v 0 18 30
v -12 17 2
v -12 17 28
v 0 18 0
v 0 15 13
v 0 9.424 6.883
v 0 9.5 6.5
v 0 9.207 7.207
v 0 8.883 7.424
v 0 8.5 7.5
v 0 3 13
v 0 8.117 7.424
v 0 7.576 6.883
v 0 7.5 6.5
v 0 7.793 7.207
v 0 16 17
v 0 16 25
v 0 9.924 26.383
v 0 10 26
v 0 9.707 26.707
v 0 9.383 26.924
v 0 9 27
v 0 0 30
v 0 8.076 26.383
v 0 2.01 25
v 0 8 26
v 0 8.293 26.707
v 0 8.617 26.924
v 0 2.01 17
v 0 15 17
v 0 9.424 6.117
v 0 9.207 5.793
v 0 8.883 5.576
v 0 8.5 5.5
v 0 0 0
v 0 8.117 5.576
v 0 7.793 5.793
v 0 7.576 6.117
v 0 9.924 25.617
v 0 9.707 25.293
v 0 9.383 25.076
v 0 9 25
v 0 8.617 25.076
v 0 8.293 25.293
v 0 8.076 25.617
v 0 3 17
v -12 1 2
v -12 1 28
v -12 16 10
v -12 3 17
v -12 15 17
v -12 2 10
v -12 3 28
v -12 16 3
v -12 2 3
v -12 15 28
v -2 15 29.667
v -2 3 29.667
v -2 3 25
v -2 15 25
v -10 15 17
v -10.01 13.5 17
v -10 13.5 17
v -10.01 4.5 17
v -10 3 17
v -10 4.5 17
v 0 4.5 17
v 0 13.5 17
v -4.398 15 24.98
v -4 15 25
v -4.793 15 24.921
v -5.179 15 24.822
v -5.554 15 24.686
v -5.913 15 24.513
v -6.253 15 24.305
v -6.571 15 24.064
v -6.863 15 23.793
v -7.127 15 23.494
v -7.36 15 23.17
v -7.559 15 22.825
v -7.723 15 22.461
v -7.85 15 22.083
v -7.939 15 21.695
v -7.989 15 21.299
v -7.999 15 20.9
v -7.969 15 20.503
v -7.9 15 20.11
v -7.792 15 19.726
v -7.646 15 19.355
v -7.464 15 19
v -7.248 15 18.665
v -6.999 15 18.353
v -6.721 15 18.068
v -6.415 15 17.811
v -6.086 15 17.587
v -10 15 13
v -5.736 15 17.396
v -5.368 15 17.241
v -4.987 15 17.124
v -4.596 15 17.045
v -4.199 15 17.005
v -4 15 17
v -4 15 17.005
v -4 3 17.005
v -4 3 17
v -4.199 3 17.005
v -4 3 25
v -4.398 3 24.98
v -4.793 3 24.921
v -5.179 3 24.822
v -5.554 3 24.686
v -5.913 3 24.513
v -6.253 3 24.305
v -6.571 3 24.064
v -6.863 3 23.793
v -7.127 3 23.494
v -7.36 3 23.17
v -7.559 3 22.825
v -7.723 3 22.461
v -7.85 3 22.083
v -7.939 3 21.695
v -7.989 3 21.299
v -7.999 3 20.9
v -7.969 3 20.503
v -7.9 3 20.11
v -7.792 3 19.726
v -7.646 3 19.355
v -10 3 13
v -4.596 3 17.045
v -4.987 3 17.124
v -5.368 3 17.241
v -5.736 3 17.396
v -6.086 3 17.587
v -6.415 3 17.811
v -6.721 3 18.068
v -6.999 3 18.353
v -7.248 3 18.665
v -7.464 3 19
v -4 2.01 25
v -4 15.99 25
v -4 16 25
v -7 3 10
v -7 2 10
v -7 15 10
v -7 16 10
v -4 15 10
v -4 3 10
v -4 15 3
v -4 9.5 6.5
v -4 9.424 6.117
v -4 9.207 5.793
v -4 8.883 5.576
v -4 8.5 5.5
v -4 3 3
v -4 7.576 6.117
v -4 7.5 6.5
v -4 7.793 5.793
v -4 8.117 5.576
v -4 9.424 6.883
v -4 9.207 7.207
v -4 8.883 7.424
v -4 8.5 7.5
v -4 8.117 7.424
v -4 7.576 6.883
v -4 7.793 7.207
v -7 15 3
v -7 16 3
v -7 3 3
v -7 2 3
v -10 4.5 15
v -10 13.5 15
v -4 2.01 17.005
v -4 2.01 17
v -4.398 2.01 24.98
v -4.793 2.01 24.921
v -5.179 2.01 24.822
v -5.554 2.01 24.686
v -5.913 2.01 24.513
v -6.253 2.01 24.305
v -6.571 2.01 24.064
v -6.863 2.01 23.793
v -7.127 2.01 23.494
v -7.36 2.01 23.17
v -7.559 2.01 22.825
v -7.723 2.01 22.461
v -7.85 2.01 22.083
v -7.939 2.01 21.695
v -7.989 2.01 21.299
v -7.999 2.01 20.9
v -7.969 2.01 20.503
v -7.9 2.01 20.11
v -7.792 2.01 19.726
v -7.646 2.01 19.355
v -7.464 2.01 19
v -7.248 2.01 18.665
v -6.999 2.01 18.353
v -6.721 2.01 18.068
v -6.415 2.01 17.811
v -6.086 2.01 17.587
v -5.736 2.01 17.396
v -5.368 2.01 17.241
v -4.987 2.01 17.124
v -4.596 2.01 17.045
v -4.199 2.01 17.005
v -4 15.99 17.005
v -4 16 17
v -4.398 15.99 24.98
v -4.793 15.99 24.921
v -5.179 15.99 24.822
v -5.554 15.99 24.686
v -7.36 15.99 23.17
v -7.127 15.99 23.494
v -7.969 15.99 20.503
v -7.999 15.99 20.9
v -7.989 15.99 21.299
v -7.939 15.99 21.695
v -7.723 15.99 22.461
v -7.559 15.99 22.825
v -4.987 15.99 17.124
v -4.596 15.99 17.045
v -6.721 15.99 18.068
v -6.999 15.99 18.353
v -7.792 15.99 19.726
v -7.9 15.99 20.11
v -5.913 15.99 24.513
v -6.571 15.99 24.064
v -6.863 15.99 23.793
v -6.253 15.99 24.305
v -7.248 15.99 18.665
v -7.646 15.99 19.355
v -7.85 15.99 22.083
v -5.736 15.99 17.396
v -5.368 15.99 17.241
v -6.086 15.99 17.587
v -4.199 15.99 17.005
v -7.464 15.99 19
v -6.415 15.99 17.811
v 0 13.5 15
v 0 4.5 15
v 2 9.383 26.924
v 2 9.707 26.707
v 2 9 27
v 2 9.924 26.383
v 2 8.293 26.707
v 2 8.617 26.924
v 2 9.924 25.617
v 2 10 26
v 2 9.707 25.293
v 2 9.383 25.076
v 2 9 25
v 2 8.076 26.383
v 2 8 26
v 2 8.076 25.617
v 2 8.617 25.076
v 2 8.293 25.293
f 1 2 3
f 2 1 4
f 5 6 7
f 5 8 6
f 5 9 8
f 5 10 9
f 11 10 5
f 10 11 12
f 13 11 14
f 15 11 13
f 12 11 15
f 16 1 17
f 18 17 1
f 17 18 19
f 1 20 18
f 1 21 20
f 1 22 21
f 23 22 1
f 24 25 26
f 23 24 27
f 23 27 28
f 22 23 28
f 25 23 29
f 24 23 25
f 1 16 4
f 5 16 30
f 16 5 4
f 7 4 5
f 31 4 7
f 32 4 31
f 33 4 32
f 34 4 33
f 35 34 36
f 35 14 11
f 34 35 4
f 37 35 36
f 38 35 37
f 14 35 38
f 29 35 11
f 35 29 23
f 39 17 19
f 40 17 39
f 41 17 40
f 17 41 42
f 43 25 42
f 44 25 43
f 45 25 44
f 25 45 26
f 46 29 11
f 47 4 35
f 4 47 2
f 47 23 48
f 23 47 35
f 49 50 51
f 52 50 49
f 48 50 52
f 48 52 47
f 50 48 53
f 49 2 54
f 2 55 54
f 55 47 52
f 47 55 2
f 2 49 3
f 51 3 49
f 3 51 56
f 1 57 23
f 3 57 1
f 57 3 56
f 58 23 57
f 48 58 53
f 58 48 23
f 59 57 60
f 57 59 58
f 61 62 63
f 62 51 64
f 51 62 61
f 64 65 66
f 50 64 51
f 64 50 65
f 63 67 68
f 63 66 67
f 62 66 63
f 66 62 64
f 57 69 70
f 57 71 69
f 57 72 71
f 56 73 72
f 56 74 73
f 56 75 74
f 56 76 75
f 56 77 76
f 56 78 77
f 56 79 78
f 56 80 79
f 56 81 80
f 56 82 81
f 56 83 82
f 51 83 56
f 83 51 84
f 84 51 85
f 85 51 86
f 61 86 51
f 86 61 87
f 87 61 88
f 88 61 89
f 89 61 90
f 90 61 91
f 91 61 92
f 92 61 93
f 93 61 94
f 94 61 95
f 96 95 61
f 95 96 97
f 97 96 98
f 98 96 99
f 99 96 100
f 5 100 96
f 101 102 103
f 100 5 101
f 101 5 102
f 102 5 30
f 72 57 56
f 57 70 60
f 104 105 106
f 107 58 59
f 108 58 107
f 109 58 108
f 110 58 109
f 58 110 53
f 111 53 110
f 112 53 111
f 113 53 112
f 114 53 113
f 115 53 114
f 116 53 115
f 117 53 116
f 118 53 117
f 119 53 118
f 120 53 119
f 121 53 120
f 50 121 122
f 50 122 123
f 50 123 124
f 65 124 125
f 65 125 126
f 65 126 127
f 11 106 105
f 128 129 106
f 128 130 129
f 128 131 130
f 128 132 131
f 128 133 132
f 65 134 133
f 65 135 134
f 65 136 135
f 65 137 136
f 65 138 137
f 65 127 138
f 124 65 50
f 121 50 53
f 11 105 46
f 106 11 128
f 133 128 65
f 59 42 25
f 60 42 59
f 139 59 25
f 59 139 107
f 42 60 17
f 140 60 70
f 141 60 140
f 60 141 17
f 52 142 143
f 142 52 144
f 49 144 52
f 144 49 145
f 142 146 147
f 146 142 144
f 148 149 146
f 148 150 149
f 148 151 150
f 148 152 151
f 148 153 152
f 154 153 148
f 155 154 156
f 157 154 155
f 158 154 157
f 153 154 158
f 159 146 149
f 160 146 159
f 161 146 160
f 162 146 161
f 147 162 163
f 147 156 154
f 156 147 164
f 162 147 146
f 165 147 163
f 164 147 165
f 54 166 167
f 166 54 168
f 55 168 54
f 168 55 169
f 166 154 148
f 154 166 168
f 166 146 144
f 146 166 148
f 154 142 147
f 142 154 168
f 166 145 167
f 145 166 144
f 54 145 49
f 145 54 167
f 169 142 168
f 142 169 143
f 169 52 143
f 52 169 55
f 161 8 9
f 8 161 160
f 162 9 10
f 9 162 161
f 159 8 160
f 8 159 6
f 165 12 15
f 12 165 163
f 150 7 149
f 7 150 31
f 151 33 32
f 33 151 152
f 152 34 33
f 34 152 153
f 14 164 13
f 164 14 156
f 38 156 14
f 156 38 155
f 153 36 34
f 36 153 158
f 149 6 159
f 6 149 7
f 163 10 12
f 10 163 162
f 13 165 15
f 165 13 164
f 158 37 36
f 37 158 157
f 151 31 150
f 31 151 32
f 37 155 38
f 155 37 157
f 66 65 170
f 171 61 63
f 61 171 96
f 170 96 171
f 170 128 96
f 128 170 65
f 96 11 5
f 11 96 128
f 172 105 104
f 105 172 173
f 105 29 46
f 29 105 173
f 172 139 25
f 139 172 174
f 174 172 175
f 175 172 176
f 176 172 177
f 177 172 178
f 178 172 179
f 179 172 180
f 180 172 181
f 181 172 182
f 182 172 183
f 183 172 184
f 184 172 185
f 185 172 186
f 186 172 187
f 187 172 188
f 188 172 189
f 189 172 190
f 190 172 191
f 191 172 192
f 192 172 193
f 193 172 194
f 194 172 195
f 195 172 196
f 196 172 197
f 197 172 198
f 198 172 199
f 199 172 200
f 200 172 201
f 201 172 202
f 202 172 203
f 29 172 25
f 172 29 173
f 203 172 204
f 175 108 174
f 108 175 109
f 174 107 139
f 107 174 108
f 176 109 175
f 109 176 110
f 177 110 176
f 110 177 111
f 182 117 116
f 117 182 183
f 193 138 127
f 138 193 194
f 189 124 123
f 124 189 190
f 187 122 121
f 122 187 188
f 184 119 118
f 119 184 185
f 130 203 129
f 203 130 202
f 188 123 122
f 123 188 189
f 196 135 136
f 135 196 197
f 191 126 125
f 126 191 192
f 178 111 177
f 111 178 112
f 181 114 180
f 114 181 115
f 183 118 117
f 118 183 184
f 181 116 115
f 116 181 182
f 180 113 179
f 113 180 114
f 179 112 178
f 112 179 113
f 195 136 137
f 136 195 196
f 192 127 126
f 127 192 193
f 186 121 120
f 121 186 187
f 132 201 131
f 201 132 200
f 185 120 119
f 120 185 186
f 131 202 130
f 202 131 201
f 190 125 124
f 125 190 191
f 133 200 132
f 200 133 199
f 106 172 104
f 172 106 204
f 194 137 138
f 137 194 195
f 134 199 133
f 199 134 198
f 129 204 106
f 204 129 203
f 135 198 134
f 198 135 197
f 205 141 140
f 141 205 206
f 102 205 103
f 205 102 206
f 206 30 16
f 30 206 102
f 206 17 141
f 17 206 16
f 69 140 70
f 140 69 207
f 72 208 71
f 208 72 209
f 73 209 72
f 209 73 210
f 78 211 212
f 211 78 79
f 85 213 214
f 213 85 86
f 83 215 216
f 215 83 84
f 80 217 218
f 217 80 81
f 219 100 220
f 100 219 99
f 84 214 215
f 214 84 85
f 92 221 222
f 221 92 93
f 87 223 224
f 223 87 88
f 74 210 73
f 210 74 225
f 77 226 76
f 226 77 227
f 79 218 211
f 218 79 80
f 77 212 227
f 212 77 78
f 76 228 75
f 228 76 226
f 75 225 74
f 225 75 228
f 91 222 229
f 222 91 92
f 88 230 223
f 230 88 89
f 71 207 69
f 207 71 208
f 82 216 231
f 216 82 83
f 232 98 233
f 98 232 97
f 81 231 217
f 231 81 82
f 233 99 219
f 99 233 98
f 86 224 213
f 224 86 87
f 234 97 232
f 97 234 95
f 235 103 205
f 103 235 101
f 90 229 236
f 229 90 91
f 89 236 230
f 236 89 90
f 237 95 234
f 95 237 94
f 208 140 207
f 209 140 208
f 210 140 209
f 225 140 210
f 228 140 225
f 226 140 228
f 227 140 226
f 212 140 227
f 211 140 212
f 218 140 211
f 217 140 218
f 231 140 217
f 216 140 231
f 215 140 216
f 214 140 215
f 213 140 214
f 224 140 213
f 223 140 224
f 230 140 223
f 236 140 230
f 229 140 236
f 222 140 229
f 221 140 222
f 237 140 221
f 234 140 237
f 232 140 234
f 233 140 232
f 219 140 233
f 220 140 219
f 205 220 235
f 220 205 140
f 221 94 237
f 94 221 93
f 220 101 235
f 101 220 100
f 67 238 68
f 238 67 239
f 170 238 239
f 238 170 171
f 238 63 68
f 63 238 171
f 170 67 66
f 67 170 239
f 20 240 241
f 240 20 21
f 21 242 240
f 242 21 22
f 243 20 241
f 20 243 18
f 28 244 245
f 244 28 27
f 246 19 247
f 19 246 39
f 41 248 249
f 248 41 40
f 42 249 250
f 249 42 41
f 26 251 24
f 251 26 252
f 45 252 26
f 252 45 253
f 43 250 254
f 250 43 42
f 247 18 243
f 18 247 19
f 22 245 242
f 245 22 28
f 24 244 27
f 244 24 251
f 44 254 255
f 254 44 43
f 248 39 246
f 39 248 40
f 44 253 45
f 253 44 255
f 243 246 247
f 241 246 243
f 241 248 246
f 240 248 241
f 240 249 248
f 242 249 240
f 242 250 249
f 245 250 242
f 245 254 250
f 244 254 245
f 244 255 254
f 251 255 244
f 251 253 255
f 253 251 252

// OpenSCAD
// file: signal_generator_foot.scad
$fa = 1;
$fs = 0.4;


initial_block_points = [
    // lower plane
    [  0,  0,  0 ],  //0
    [  0, 18,  0 ],  //1
    [ 30, 18,  0 ],  //2
    [ 30,  0,  0 ],  //3
    // upper plane
    [  2,  1, 12 ],  //4
    [  2, 17, 12 ],  //5
    [ 28, 17, 12 ],  //6
    [ 28,  1, 12 ]]; //7

  
initial_block_faces = [
    [0,1,2,3],  // lower plane
    [4,5,6,7],  // upper plane
    [0,1,5,4],  // west
    [1,2,6,5],  // north
    [2,3,7,6],  // east
    [3,0,4,7]]; // south



module signal_generator_foot() {
    
    difference() {
        
        // hull to ensure the polyhedron is solid when performing the difference
        hull() {
            polyhedron(points=initial_block_points, faces=initial_block_faces);
        }
        
        translate([17, 3, 2])
            cube([13, 12, 12+0.01]);    
        
        translate([15, 3, -0.01])
            cube([10, 12, 2+0.02]);    
        
        translate([3, 3, 4])
            cube([7, 12, 8+0.01]);
        
        translate([3, 15-0.01, 7])
            cube([7, 1+0.01, 5+0.01]);
        
        translate([3, 2, 7])
            cube([7, 1+0.01, 5+0.01]);
        
        translate([6.5, 8.5, -0.01])
            cylinder(h=4+0.02, r=1);
        
        translate([13, 3, -0.01])
            cube([5, 12, 10+0.01]);
            
        translate([17, 2.01, -0.01])
            cube([8, 2, 4.01]);
            
        translate([21, 3.01, 4])
            rotate([90, 0, 0])
                cylinder(h=2, r=4, center=true);
            
        translate([17, 14-0.01, -0.01])
            cube([8, 2.01, 4.01]);
            
        translate([21, 15-0.01, 4])
            rotate([90, 0, 0])
                cylinder(h=2, r=4, center=true);
        
    }

    translate([15, 4.5, 0])
        cube([2, 9, 10+0.01]);

    translate([26, 9,-2])
        cylinder(h=2+0.01, r=1);

}
// main file
use <signal_generator_foot.scad>


rotate([0, -90, 0])
    signal_generator_foot();
